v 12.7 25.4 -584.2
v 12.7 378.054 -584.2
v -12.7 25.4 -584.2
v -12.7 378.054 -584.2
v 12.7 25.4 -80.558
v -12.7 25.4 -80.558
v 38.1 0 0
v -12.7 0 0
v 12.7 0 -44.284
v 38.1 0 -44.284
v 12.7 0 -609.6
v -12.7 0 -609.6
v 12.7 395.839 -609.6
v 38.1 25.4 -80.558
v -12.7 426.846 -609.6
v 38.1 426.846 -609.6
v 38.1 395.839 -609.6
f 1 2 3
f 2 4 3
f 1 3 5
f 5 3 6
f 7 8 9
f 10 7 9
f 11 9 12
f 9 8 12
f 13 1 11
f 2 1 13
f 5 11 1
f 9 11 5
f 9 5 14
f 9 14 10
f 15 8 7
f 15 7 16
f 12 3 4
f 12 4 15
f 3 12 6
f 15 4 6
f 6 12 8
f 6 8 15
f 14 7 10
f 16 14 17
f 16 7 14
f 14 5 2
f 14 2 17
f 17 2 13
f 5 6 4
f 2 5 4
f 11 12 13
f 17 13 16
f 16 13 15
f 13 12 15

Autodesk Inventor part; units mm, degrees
ref_plane "YZ Plane" through (0, 0, 0) normal (1, 0, 0) x (0, 1, 0)
ref_plane "XZ Plane" through (0, 0, 0) normal (0, 1, 0) x (-1, 0, 0)
ref_plane "XY Plane" through (0, 0, 0) normal (0, 0, 1) x (1, 0, 0)
sketch "Sketch1" plane through (0, 0, 0) normal (1, 0, 0) x (0, 1, 0)
  line L0 (0, 0) -> (0, -609.6)
  line L1 (0, -609.6) -> (426.8465, -609.6)
  line L2 (426.8465, -609.6) -> (0, 0)
  line L3 (25.4, -80.5585) -> (378.0536, -584.2)
  line L4 (378.0536, -584.2) -> (25.4, -584.2)
  line L5 (25.4, -584.2) -> (25.4, -80.5585)
  dimension "d0" = 609.6
  dimension "d1" = 35
  dimension "d2" = 25.4
  dimension "d3" = 25.4
  dimension "d4" = 25.4
extrude "Extrusion1" add sketch "Sketch1" along normal mid plane 25.4
sketch "Sketch4" plane through (12.7, 0, 0) normal (1, 0, 0) x (0, 0, -1)
  line L0 (609.6, 0) -> (609.6, 426.8465) projected
  line L1 (0, 0) -> (609.6, 426.8465)
  line L2 (584.2, 25.4) -> (80.5585, 25.4) projected
  line L3 (80.5585, 25.4) -> (609.6, 395.8388)
  line L4 (80.5585, 25.4) -> (44.2835, 0)
  line L5 (0, 0) -> (609.6, 0) projected
  line L6 (44.2835, 0) -> (0, 0)
  line L7 (609.6, 426.8465) -> (609.6, 395.8388)
extrude "Extrusion3" add sketch "Sketch4" along normal blind 25.4 contours L3 L4 L5 L1 L0
sketch "Sketch2" plane through (-12.7, 0, 0) normal (-1, 0, 0) x (0, 0, 1)
  line L0 (-609.6, 0) -> (-609.6, 426.8465) projected
  line L1 (-609.6, 426.8465) -> (0, 0) projected
  line L2 (-609.6, 426.8465) -> (0, 0)
  line L3 (-80.5585, 25.4) -> (-584.2, 378.0536) projected
  line L4 (-584.2, 378.0536) -> (-39.5154, 0)
  line L5 (0, 0) -> (-609.6, 0) projected
  line L6 (-584.2, 378.0536) -> (-609.6, 395.8388)
  line L7 (-609.6, 511.5151) -> (-609.6, 395.8388)
  line L8 (-39.5154, 0) -> (0, 0)
  point P0 (-69.7859, 25.4)
properties part number "ballRampRightSide-35degree-V04"
